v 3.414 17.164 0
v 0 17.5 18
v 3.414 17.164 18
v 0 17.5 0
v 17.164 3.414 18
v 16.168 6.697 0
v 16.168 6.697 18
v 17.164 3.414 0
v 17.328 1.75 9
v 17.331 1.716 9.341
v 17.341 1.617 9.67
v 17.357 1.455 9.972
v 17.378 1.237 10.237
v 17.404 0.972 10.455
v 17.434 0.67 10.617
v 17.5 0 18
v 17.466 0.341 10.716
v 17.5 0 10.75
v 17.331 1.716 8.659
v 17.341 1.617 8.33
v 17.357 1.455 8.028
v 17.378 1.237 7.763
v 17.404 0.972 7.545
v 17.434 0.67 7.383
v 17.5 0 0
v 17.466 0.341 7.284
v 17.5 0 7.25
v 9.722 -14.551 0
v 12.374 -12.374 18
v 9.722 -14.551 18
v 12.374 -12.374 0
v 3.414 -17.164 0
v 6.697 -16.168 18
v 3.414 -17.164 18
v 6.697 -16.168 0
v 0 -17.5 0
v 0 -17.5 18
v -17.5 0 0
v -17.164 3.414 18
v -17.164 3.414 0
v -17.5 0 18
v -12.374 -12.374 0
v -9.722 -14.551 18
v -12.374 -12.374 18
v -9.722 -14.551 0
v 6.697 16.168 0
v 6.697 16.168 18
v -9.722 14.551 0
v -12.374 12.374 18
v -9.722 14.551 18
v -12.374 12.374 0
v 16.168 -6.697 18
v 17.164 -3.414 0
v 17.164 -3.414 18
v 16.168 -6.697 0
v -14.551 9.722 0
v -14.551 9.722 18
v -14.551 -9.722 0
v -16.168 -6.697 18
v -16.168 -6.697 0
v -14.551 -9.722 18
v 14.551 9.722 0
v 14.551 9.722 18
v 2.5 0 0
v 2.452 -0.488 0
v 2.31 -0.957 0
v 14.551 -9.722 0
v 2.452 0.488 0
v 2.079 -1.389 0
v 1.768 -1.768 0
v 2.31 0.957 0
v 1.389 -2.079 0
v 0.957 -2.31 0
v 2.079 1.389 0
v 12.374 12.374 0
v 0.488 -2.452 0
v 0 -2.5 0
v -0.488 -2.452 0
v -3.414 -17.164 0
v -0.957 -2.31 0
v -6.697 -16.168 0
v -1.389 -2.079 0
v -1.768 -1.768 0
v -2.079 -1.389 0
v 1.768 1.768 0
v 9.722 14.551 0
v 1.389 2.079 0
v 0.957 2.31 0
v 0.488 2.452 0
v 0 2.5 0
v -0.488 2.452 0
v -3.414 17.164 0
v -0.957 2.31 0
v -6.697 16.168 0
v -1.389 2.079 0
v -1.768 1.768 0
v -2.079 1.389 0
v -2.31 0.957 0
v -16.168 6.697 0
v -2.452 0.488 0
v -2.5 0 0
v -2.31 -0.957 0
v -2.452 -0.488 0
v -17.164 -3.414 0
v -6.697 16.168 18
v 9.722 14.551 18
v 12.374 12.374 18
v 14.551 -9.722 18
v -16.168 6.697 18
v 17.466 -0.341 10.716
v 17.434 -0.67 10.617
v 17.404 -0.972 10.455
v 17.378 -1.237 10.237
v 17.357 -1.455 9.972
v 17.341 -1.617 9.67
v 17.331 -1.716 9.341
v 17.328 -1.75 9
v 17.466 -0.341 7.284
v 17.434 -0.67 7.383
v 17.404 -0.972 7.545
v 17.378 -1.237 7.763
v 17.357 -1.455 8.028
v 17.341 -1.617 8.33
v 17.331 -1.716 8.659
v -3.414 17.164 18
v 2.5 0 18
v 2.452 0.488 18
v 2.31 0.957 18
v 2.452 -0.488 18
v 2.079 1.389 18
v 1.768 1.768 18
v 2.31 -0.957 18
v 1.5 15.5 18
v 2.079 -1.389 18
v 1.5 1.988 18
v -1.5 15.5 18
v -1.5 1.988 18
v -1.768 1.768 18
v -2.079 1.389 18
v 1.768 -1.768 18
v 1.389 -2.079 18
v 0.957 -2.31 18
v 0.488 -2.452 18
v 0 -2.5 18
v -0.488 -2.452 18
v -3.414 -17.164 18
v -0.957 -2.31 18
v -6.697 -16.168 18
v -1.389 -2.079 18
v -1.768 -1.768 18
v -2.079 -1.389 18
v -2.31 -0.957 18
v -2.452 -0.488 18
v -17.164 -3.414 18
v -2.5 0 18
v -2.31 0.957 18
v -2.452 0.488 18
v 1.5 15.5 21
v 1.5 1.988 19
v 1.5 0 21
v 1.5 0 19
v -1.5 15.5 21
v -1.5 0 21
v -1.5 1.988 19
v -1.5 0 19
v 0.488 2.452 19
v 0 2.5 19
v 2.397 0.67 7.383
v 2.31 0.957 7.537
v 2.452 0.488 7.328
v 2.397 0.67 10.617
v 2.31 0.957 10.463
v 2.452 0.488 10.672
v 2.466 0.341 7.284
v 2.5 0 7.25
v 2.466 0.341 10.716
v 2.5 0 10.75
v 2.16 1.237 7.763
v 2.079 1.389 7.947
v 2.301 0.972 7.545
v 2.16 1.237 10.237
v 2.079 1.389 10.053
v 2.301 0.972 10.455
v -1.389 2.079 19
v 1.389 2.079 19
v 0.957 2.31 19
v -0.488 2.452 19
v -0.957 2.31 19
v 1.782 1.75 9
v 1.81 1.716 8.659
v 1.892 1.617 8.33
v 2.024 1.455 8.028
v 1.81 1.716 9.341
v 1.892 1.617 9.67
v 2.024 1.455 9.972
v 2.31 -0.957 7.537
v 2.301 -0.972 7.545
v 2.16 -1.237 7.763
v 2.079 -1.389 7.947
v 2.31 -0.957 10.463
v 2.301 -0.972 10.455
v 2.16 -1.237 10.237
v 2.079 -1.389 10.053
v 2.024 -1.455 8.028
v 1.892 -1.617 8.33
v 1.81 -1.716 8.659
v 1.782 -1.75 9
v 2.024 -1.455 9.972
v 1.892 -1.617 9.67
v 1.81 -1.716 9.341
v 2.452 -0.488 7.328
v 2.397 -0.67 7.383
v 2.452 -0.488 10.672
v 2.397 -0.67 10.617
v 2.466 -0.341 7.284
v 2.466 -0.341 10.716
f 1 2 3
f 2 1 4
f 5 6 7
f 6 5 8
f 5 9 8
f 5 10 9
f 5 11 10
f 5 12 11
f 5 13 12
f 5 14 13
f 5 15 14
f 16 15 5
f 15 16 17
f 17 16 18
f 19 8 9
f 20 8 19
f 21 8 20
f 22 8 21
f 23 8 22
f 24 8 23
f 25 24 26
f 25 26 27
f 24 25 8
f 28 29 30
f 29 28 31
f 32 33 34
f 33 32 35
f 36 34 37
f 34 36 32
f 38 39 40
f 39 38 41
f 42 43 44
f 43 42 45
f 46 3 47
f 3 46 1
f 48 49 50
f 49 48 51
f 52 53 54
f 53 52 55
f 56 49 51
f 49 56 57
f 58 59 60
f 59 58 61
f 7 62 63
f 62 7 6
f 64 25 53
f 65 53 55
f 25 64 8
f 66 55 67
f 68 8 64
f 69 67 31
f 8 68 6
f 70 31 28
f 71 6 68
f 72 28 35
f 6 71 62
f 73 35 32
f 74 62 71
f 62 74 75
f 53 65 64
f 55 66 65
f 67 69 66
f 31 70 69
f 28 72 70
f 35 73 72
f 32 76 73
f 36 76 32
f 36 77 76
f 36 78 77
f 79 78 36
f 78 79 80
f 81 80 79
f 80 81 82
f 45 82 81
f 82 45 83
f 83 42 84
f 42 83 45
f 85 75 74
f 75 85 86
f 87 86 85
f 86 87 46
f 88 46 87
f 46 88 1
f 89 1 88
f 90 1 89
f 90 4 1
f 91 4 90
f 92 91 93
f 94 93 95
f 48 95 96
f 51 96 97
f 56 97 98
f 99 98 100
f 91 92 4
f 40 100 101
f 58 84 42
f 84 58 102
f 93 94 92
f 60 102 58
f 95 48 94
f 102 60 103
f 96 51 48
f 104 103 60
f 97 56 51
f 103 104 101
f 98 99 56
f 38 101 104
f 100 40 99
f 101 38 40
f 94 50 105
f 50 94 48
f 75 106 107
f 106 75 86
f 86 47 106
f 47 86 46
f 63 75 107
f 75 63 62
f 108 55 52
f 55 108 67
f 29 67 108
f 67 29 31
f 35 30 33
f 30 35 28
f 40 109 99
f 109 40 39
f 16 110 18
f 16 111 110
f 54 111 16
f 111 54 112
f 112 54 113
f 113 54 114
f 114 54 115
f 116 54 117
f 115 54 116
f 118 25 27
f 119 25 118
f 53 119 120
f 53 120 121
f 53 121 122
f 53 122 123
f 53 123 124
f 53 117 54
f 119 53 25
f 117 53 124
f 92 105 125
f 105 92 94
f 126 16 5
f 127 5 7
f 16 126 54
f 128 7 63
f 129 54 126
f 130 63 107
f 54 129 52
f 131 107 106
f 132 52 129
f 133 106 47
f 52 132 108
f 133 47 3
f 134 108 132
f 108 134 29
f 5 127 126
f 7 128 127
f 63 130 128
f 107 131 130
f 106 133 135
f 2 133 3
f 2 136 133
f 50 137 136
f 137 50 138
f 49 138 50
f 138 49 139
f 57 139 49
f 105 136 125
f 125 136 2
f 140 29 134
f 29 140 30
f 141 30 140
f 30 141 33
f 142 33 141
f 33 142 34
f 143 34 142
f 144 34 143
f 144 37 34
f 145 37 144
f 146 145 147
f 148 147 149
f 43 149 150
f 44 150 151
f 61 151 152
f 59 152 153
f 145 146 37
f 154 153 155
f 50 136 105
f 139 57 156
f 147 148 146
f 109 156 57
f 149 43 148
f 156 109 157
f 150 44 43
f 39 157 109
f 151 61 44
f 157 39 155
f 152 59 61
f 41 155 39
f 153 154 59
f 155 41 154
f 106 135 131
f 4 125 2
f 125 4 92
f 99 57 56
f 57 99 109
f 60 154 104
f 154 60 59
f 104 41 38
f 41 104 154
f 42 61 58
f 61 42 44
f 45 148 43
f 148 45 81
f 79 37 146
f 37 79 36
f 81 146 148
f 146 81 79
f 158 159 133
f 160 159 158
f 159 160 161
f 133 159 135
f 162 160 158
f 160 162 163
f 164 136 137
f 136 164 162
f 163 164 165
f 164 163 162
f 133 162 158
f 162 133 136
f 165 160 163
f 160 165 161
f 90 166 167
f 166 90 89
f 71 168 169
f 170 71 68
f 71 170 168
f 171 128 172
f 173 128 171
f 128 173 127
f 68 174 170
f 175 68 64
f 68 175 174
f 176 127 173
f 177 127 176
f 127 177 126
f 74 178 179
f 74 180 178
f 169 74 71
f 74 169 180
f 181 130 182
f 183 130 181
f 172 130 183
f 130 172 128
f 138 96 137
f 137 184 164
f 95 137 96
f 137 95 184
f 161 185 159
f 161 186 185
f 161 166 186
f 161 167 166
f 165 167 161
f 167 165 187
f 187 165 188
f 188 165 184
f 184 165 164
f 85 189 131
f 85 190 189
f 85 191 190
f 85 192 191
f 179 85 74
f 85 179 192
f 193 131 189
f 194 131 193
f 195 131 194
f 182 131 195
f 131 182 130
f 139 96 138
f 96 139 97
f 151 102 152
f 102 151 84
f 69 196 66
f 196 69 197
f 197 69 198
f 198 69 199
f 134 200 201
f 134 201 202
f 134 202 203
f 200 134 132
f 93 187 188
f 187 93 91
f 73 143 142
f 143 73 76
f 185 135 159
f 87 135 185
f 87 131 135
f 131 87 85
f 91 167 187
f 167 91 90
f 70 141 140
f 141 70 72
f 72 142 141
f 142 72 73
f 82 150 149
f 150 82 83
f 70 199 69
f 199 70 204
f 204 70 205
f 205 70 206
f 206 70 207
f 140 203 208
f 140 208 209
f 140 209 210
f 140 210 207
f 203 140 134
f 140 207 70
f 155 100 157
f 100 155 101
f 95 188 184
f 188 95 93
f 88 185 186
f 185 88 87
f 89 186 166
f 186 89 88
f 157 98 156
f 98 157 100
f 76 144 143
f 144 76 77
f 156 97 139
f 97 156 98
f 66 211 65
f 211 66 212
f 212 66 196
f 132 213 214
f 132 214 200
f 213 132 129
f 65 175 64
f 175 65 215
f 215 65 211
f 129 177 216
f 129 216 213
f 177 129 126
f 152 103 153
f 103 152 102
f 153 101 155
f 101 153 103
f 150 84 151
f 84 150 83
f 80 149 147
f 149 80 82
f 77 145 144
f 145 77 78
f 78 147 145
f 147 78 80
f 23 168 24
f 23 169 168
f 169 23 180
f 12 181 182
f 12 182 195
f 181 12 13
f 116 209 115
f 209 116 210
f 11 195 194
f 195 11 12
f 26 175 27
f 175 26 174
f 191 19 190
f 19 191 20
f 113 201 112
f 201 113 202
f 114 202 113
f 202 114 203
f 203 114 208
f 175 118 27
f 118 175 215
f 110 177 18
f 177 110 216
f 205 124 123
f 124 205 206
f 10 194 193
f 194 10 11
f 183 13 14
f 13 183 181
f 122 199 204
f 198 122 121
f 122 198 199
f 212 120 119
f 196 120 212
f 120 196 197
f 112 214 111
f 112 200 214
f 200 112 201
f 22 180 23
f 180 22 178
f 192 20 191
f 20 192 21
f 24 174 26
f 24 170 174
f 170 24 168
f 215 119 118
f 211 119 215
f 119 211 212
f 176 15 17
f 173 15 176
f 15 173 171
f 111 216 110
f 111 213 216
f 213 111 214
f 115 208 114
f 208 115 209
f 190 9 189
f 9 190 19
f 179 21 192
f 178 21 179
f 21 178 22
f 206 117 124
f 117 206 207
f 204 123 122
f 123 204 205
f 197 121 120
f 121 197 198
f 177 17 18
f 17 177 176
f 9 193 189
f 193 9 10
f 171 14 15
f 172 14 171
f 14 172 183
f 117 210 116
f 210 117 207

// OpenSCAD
$fn = 32;

// ----------------------------------------------------------------------
// Control knob: pointer knob
// ----------------------------------------------------------------------

// --- parameters (mm) ---
rib_w = 3;                // pointer rib width
rib_h = 4;                // pointer rib height
knob_d = 35;              // knob body diameter
knob_h = 18;              // knob body height
bore_d = 5;               // shaft bore diameter
set_d = 3.5;              // set screw bore diameter

rib_poke = rib_h - 1;  // rib height above the top
total_h = knob_h + rib_h - 1;  // overall height

difference() {
  union() {
    cylinder(h = knob_h, d = knob_d);
    translate([-rib_w / 2, 0, knob_h - 1])
      cube([rib_w, knob_d / 2 - 2, rib_h]);
  }
  translate([0, 0, -1]) cylinder(h = knob_h + 2, d = bore_d);
  translate([-1, 0, knob_h / 2]) rotate([0, 90, 0])
    cylinder(h = knob_d / 2 + bore_d / 2 + 2, d = set_d);}
